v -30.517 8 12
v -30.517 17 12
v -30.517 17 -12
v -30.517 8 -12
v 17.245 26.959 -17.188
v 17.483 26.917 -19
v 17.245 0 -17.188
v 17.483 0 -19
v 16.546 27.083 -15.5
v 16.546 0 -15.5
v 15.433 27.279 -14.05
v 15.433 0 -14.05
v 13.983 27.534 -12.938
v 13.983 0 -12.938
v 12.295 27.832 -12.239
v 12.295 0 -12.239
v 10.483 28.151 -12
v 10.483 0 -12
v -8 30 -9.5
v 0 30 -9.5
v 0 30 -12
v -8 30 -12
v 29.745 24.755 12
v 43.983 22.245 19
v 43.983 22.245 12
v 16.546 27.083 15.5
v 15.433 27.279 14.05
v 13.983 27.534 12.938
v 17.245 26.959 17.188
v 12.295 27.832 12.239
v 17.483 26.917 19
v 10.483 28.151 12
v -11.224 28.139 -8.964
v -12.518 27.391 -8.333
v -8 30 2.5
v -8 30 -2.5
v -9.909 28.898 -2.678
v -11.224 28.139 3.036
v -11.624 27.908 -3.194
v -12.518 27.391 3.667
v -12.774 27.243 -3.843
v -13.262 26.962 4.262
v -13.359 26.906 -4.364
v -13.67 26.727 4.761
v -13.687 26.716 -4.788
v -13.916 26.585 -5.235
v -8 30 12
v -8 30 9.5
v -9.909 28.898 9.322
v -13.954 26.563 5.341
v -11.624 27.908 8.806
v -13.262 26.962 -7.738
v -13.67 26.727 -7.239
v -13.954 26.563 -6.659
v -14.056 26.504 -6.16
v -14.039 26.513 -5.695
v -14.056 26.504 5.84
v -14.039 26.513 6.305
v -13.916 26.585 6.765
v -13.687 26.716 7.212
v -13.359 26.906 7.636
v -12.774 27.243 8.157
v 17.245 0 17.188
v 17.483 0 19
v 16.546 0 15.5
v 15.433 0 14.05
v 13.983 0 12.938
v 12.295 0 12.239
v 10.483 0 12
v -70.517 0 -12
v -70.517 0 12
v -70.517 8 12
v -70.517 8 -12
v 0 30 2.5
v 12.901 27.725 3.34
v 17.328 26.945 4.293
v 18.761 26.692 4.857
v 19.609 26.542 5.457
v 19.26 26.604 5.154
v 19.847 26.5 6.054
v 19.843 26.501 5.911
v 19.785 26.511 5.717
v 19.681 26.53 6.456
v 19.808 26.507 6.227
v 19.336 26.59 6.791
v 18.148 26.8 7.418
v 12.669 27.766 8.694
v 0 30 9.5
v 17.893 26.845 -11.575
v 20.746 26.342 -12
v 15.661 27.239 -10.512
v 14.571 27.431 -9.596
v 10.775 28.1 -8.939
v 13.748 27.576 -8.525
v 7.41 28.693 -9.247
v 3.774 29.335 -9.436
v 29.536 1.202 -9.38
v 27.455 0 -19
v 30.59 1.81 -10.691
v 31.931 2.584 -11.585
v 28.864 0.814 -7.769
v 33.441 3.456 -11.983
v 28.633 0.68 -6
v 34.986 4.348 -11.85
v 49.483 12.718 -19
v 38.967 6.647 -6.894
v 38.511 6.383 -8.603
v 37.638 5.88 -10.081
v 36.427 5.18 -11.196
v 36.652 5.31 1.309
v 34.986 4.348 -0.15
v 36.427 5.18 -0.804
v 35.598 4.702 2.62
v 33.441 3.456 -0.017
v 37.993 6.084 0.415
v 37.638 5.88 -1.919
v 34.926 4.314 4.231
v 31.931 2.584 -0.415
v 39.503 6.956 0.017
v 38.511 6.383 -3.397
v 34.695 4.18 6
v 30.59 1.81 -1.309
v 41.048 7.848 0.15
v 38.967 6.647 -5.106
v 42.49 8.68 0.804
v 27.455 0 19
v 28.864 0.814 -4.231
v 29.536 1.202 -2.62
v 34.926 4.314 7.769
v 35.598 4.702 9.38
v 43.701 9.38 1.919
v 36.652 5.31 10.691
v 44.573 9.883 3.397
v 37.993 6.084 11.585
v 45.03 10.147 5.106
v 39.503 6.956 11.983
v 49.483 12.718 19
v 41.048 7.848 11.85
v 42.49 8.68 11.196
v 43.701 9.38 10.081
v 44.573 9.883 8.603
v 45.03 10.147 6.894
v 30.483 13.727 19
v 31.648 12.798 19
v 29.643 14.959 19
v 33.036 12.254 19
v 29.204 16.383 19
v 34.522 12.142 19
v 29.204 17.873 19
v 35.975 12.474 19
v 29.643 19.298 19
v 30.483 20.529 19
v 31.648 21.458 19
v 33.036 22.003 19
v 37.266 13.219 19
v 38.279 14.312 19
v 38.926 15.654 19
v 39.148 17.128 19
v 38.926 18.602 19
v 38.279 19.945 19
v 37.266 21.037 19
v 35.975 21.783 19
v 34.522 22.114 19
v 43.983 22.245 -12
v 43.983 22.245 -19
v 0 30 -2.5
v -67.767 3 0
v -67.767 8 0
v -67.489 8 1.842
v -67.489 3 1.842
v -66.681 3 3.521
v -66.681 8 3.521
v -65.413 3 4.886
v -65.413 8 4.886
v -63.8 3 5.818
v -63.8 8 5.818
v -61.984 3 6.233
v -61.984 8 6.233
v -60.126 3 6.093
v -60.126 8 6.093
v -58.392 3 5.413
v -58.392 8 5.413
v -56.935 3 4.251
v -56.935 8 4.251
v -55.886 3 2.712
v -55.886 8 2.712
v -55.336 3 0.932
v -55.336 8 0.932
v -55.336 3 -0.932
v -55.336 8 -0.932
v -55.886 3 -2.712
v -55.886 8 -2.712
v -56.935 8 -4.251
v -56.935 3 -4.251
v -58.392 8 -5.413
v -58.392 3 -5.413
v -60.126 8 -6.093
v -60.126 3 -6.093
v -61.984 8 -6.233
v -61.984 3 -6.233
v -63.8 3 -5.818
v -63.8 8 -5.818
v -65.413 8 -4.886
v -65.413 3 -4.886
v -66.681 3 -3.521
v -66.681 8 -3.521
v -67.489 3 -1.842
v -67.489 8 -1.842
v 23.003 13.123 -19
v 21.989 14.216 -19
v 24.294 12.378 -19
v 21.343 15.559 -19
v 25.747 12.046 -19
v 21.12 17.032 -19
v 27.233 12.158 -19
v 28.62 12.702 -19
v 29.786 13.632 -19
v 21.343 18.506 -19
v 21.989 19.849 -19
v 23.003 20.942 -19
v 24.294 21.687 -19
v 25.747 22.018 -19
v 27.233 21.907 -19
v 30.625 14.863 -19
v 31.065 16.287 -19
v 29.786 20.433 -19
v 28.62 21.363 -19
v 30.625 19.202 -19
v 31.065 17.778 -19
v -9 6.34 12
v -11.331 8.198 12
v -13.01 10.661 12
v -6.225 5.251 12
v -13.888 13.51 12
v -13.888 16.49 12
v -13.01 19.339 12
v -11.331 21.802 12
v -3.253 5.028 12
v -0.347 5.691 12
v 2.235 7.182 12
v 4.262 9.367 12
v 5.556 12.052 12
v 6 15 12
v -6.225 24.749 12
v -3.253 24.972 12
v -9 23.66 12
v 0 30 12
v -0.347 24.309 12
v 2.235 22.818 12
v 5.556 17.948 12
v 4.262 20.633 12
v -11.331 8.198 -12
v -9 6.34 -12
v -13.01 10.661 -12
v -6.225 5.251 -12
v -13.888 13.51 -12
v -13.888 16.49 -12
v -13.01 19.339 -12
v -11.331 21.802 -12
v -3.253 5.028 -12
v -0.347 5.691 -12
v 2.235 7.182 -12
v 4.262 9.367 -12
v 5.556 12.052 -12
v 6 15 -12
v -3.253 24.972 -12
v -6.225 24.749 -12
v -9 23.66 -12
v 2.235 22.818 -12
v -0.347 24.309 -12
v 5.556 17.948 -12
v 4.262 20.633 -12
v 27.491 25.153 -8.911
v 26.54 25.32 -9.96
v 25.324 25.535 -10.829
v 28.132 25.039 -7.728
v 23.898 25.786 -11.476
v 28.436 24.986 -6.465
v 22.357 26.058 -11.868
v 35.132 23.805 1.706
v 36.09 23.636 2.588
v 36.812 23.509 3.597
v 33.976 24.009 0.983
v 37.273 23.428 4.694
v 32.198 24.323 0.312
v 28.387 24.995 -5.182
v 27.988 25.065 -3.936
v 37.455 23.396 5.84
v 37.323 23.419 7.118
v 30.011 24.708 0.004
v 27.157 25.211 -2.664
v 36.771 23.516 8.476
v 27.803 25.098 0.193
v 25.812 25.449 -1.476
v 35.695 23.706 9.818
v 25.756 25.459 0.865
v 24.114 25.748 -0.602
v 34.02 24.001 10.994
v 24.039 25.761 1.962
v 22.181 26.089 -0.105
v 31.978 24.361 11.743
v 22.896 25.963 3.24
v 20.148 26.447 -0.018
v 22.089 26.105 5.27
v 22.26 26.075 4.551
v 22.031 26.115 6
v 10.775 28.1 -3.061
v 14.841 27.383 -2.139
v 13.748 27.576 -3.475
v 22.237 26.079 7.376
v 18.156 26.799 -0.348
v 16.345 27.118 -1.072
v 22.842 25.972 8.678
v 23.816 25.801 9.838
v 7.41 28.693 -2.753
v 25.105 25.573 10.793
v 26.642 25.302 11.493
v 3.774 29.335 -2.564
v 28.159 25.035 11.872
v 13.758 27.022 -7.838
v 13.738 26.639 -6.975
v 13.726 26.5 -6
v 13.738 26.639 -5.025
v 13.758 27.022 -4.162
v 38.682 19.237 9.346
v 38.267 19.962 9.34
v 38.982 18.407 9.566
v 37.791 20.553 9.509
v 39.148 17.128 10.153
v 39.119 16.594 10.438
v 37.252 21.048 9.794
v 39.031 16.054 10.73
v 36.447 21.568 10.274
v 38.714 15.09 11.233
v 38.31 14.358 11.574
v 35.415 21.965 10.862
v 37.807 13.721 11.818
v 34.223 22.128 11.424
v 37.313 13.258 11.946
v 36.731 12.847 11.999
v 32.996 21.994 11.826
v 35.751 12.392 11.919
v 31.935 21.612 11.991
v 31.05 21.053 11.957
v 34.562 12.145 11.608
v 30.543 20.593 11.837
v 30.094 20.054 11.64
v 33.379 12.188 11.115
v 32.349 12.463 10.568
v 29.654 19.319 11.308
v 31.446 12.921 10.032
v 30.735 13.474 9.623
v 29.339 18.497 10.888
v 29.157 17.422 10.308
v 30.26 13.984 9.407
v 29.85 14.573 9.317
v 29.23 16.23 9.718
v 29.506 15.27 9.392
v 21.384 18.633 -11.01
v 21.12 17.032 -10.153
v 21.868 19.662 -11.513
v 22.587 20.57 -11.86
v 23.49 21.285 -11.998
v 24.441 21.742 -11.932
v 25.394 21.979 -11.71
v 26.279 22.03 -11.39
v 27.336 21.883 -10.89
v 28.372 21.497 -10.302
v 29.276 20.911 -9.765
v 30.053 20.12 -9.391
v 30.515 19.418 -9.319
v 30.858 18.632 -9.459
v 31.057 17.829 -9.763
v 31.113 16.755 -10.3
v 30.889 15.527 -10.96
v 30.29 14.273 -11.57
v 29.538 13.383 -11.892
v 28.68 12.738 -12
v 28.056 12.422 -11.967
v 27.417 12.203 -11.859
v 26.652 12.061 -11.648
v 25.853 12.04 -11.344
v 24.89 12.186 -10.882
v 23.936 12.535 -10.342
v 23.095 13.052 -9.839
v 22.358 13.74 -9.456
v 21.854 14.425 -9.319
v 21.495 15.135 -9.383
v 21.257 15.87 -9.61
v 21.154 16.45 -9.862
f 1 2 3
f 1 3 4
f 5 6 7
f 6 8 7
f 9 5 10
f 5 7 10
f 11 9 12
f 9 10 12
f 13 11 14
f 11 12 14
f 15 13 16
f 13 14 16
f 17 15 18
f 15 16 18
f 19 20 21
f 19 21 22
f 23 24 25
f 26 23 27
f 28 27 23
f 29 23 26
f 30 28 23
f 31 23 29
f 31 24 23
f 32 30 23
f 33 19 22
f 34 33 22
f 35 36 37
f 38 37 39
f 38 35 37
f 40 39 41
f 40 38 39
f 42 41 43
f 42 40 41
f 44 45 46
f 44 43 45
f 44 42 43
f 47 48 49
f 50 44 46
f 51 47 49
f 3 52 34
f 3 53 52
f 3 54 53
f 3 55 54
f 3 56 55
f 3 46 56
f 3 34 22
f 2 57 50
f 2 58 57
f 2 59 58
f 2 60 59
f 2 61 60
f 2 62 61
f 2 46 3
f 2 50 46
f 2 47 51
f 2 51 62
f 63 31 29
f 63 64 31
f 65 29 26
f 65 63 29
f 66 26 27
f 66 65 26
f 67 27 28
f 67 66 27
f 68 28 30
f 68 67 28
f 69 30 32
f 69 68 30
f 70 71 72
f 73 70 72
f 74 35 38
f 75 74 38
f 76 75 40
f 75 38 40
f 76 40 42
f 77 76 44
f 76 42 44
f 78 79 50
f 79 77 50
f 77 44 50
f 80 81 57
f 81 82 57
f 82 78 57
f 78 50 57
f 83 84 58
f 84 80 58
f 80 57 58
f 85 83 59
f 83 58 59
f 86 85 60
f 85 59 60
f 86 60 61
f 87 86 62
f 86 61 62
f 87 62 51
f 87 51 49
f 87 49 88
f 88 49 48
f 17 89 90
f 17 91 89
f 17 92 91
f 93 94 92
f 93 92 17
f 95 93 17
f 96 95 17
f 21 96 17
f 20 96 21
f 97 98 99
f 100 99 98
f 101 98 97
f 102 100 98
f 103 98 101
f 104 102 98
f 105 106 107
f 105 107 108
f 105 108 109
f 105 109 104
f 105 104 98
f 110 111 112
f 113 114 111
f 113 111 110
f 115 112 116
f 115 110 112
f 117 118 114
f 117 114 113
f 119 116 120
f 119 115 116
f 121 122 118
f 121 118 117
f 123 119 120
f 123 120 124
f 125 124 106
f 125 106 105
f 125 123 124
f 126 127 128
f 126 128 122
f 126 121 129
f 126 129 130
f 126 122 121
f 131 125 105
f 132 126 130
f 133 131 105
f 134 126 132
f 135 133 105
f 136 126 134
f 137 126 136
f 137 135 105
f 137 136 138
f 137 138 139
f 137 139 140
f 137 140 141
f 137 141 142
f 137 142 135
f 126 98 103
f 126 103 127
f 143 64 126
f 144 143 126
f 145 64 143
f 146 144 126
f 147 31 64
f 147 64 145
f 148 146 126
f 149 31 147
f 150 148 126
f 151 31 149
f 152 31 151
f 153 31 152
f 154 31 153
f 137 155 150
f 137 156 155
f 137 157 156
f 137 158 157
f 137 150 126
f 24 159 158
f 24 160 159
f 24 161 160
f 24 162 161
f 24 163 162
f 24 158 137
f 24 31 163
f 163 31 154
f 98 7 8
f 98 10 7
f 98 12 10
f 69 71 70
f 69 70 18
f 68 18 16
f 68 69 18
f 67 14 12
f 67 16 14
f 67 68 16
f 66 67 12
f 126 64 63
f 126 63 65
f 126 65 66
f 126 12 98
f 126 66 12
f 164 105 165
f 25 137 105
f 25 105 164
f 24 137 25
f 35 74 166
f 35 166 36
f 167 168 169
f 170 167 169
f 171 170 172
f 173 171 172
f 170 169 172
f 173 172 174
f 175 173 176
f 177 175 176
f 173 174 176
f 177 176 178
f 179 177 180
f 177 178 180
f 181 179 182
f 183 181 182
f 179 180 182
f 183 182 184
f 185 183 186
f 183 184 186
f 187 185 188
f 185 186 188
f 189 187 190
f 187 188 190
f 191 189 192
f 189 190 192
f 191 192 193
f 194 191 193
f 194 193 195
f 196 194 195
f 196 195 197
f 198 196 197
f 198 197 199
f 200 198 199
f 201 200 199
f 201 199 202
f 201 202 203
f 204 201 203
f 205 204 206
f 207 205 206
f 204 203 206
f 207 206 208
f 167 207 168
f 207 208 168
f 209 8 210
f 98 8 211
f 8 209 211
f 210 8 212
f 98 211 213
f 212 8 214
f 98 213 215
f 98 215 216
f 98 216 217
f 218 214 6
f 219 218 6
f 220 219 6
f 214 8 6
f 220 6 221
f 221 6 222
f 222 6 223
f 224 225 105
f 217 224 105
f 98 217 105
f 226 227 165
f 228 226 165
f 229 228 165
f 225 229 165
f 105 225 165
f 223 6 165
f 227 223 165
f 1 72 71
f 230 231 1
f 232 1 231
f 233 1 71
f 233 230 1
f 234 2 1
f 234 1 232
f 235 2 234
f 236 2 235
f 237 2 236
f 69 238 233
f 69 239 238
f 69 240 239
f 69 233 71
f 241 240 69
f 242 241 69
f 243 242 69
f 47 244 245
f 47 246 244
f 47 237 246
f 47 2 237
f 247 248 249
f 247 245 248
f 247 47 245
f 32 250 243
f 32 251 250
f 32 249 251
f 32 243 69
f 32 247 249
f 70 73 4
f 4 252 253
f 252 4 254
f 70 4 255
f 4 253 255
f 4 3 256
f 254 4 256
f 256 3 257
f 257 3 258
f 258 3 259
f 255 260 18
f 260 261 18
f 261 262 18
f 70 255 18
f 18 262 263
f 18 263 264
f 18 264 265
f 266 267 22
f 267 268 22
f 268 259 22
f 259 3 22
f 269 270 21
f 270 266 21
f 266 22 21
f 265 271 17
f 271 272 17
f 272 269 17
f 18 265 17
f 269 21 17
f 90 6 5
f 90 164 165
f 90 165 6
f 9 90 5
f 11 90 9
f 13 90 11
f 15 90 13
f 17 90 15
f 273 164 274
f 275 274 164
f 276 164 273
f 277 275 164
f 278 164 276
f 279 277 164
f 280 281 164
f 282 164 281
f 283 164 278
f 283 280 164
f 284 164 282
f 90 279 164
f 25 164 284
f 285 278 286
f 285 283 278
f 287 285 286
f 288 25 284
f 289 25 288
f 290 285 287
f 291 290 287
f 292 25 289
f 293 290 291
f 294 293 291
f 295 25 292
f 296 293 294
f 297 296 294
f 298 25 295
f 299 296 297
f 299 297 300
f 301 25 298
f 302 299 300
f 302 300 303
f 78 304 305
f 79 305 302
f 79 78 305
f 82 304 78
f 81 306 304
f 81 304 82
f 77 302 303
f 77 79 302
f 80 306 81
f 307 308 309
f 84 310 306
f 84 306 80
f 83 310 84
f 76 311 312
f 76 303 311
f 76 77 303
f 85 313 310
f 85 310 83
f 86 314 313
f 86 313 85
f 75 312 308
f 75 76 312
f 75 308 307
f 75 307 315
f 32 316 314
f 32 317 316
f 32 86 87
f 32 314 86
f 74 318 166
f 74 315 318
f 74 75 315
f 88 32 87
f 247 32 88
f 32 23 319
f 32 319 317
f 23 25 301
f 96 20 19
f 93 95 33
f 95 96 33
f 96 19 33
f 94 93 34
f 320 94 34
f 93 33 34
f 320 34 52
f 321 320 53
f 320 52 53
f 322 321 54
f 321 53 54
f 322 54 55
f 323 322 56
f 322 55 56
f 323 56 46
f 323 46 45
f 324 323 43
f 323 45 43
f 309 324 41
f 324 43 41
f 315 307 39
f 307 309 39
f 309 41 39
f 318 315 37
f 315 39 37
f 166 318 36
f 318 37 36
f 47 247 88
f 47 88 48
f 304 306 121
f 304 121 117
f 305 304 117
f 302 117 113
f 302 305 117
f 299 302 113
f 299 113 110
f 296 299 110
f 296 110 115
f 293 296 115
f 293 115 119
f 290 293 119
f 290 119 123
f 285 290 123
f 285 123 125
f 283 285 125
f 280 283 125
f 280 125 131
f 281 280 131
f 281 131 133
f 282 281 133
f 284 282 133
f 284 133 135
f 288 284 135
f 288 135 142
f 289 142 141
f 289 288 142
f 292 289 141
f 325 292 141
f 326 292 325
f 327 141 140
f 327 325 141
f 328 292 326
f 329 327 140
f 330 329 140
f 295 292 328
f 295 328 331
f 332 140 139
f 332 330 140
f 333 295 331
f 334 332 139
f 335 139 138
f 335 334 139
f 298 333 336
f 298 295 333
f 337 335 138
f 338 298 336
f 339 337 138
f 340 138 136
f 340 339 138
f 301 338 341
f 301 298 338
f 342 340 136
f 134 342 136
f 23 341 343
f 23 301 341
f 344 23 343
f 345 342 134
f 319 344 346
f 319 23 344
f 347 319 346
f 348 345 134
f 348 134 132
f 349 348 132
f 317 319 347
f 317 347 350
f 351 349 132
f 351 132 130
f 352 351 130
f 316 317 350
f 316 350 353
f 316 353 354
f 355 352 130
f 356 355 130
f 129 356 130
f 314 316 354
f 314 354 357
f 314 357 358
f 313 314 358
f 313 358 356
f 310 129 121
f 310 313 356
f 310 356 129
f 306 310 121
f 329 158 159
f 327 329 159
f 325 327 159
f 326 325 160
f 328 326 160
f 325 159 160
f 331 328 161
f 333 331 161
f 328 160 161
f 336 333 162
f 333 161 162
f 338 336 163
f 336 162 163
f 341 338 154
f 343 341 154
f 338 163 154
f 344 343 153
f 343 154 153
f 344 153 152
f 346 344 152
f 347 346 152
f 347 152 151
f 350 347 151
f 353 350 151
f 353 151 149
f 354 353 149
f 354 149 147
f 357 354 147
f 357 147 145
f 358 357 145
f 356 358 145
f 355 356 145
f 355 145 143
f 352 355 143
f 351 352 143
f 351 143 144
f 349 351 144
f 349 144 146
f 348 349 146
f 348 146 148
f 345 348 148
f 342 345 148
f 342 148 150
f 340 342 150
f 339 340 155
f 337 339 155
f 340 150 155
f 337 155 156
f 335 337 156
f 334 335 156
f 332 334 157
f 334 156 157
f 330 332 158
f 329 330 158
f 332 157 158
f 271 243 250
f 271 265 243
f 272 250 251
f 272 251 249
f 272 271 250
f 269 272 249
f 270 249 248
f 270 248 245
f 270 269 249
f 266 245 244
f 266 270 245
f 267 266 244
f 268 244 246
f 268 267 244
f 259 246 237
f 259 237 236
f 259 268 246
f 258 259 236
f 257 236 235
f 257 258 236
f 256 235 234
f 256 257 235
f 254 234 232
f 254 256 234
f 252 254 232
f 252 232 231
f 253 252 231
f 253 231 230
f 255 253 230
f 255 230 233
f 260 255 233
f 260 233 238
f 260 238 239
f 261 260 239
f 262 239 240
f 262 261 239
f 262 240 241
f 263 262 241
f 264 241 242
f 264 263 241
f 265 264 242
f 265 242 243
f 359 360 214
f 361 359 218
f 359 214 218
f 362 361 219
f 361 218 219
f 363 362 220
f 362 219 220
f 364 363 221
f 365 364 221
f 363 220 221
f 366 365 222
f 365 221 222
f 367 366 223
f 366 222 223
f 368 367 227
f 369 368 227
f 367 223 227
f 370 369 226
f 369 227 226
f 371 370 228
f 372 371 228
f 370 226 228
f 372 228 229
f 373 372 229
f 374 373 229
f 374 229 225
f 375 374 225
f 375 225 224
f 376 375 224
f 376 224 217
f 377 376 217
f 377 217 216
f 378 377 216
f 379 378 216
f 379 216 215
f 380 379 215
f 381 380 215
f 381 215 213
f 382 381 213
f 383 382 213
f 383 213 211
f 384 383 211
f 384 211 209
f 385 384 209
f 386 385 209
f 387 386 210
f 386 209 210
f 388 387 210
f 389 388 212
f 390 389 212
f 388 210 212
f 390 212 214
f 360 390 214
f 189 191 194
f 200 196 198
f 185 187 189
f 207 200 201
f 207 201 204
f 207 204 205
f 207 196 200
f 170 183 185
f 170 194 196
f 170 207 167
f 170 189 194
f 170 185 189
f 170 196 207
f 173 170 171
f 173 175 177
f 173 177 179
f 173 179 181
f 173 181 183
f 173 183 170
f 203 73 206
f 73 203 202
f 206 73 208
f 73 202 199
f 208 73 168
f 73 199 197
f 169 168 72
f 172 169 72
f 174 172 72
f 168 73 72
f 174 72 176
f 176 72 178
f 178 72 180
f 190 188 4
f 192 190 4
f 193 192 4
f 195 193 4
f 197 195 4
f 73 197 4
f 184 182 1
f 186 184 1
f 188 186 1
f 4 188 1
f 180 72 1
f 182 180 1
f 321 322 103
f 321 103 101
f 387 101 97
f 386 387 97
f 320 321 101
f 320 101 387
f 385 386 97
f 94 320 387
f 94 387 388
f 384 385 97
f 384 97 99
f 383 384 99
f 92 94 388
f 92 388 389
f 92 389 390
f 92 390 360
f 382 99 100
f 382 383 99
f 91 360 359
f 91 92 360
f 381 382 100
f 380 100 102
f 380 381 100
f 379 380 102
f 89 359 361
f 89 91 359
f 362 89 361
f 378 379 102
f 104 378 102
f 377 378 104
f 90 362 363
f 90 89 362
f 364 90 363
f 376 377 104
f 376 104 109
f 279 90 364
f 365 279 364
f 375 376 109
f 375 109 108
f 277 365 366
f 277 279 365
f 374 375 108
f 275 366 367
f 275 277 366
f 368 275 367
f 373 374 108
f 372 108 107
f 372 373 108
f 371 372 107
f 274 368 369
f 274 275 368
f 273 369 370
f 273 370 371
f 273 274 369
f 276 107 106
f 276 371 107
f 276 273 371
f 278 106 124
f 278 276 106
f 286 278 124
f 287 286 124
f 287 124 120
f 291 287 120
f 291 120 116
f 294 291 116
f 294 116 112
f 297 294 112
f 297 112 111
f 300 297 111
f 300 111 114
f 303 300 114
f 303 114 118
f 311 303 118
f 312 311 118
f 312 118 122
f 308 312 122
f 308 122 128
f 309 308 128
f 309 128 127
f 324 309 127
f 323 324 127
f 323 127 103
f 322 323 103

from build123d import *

# Parameters (mm, degrees)
SKETCH1_R               = 10
SKETCH1_W               = 40
SKETCH1_H               = 8
BOSS_EXTRUDE1_DEPTH     = 12
BOSS_EXTRUDE2_DEPTH     = 19
CUT_EXTRUDE1_DEPTH      = 38
CUT_EXTRUDE1_DEPTH_BACK = 38
SKETCH4_R               = 6
FILLET1_R               = 7
SKETCH6_R               = 6.25
CUT_EXTRUDE2_DEPTH      = 5
CUT_EXTRUDE3_DEPTH      = 56
CUT_EXTRUDE3_DEPTH_BACK = 21
SKETCH9_R               = 5
CUT_EXTRUDE4_DEPTH      = 14
SKETCH10_R              = 5
CUT_EXTRUDE5_DEPTH      = 11


with BuildPart() as part:
    # Sketch1 → Boss-Extrude1 (new, symmetric)
    # profile 1 of 2: a face of its own
    with BuildSketch(Plane.XY):
        Polygon((49.483339502, 12.718271103), (43.983339502, 22.244550544), (0, 30), (-8, 30), (-30.516660498, 17), (-30.516660498, 8), (-30.516660498, 0), (0, 0), (27.454647768, 0), align=None)
        with Locations((-4, 15)):
            Circle(SKETCH1_R, mode=Mode.SUBTRACT)
    # profile 2 of 2: a face of its own
    with BuildSketch(Plane.XY):
        with Locations((-50.516660498, 4)):
            Rectangle(SKETCH1_W, SKETCH1_H)
    extrude(amount=BOSS_EXTRUDE1_DEPTH, both=True)

    # Sketch2 → Boss-Extrude2 (add, symmetric)
    with BuildSketch(Plane.XY):
        Polygon((17.483339502, 26.917215533), (17.483339502, 0), (27.454647768, 0), (49.483339502, 12.718271103), (43.983339502, 22.244550544), align=None)
    extrude(amount=BOSS_EXTRUDE2_DEPTH, both=True)

    # Sketch4 → Cut-Extrude1 (cut, two sides: drawn at the far end of the back side and taken through both)
    with BuildSketch(Plane(origin=(1.363661942, -2.361931768, 0), x_dir=(-0.8660254037844379, -0.5000000000000014, 0), z_dir=(0.5000000000000014, -0.8660254037844379, 0)).offset(-CUT_EXTRUDE1_DEPTH_BACK)):
        with Locations((-31.137235053, 6)):
            Circle(SKETCH4_R)
        with Locations((-38.137235053, -6)):
            Circle(SKETCH4_R)
    extrude(amount=CUT_EXTRUDE1_DEPTH + CUT_EXTRUDE1_DEPTH_BACK, mode=Mode.SUBTRACT)

    # Fillet1
    fillet1_edges = [part.edges().sort_by_distance(p)[0] for p in [
        (17.483339502, 13.458607766, -12),
        (17.483339502, 13.458607766, 12),
    ]]
    fillet(fillet1_edges, radius=FILLET1_R - 0.0001)  # a hair under: the kernel refuses the full size

    # Sketch6 → Cut-Extrude2 (cut)
    with BuildSketch(Plane(origin=(0, 8, 0), x_dir=(1, 0, 0), z_dir=(0, 1, 0))):
        with Locations(Location((-61.516660498, 0, 0), (0, 0, 180))):
            Circle(SKETCH6_R)
    extrude(amount=-CUT_EXTRUDE2_DEPTH, mode=Mode.SUBTRACT)

    # Sketch8 → Cut-Extrude3 (cut, two sides: drawn at the far end of the back side and taken through both)
    with BuildSketch(Plane(origin=(0, 0, 0), x_dir=(0, 0, -1), z_dir=(1, 0, 0)).offset(-CUT_EXTRUDE3_DEPTH_BACK)):
        with BuildLine():
            Line((-9.5, 30), (-2.5, 30))
            ThreePointArc((-2.5, 30), (-6, 26.5), (-9.5, 30))
        make_face()
        with BuildLine():
            Line((2.5, 30), (9.5, 30))
            ThreePointArc((9.5, 30), (6, 26.5), (2.5, 30))
        make_face()
    extrude(amount=CUT_EXTRUDE3_DEPTH + CUT_EXTRUDE3_DEPTH_BACK, mode=Mode.SUBTRACT)

    # Sketch9 → Cut-Extrude4 (cut)
    with BuildSketch(Plane.XY.offset(19)):
        with Locations((34.148109615, 17.12820927)):
            Circle(SKETCH9_R)
    extrude(amount=-CUT_EXTRUDE4_DEPTH, mode=Mode.SUBTRACT)

    # Sketch10 → Cut-Extrude5 (cut)
    with BuildSketch(Plane(origin=(0, 0, -19), x_dir=(-1, 0, 0), z_dir=(0, 0, -1))):
        with Locations((-26.120496882, 17.032442386)):
            Circle(SKETCH10_R)
    extrude(amount=-CUT_EXTRUDE5_DEPTH, mode=Mode.SUBTRACT)


solid = part.part
